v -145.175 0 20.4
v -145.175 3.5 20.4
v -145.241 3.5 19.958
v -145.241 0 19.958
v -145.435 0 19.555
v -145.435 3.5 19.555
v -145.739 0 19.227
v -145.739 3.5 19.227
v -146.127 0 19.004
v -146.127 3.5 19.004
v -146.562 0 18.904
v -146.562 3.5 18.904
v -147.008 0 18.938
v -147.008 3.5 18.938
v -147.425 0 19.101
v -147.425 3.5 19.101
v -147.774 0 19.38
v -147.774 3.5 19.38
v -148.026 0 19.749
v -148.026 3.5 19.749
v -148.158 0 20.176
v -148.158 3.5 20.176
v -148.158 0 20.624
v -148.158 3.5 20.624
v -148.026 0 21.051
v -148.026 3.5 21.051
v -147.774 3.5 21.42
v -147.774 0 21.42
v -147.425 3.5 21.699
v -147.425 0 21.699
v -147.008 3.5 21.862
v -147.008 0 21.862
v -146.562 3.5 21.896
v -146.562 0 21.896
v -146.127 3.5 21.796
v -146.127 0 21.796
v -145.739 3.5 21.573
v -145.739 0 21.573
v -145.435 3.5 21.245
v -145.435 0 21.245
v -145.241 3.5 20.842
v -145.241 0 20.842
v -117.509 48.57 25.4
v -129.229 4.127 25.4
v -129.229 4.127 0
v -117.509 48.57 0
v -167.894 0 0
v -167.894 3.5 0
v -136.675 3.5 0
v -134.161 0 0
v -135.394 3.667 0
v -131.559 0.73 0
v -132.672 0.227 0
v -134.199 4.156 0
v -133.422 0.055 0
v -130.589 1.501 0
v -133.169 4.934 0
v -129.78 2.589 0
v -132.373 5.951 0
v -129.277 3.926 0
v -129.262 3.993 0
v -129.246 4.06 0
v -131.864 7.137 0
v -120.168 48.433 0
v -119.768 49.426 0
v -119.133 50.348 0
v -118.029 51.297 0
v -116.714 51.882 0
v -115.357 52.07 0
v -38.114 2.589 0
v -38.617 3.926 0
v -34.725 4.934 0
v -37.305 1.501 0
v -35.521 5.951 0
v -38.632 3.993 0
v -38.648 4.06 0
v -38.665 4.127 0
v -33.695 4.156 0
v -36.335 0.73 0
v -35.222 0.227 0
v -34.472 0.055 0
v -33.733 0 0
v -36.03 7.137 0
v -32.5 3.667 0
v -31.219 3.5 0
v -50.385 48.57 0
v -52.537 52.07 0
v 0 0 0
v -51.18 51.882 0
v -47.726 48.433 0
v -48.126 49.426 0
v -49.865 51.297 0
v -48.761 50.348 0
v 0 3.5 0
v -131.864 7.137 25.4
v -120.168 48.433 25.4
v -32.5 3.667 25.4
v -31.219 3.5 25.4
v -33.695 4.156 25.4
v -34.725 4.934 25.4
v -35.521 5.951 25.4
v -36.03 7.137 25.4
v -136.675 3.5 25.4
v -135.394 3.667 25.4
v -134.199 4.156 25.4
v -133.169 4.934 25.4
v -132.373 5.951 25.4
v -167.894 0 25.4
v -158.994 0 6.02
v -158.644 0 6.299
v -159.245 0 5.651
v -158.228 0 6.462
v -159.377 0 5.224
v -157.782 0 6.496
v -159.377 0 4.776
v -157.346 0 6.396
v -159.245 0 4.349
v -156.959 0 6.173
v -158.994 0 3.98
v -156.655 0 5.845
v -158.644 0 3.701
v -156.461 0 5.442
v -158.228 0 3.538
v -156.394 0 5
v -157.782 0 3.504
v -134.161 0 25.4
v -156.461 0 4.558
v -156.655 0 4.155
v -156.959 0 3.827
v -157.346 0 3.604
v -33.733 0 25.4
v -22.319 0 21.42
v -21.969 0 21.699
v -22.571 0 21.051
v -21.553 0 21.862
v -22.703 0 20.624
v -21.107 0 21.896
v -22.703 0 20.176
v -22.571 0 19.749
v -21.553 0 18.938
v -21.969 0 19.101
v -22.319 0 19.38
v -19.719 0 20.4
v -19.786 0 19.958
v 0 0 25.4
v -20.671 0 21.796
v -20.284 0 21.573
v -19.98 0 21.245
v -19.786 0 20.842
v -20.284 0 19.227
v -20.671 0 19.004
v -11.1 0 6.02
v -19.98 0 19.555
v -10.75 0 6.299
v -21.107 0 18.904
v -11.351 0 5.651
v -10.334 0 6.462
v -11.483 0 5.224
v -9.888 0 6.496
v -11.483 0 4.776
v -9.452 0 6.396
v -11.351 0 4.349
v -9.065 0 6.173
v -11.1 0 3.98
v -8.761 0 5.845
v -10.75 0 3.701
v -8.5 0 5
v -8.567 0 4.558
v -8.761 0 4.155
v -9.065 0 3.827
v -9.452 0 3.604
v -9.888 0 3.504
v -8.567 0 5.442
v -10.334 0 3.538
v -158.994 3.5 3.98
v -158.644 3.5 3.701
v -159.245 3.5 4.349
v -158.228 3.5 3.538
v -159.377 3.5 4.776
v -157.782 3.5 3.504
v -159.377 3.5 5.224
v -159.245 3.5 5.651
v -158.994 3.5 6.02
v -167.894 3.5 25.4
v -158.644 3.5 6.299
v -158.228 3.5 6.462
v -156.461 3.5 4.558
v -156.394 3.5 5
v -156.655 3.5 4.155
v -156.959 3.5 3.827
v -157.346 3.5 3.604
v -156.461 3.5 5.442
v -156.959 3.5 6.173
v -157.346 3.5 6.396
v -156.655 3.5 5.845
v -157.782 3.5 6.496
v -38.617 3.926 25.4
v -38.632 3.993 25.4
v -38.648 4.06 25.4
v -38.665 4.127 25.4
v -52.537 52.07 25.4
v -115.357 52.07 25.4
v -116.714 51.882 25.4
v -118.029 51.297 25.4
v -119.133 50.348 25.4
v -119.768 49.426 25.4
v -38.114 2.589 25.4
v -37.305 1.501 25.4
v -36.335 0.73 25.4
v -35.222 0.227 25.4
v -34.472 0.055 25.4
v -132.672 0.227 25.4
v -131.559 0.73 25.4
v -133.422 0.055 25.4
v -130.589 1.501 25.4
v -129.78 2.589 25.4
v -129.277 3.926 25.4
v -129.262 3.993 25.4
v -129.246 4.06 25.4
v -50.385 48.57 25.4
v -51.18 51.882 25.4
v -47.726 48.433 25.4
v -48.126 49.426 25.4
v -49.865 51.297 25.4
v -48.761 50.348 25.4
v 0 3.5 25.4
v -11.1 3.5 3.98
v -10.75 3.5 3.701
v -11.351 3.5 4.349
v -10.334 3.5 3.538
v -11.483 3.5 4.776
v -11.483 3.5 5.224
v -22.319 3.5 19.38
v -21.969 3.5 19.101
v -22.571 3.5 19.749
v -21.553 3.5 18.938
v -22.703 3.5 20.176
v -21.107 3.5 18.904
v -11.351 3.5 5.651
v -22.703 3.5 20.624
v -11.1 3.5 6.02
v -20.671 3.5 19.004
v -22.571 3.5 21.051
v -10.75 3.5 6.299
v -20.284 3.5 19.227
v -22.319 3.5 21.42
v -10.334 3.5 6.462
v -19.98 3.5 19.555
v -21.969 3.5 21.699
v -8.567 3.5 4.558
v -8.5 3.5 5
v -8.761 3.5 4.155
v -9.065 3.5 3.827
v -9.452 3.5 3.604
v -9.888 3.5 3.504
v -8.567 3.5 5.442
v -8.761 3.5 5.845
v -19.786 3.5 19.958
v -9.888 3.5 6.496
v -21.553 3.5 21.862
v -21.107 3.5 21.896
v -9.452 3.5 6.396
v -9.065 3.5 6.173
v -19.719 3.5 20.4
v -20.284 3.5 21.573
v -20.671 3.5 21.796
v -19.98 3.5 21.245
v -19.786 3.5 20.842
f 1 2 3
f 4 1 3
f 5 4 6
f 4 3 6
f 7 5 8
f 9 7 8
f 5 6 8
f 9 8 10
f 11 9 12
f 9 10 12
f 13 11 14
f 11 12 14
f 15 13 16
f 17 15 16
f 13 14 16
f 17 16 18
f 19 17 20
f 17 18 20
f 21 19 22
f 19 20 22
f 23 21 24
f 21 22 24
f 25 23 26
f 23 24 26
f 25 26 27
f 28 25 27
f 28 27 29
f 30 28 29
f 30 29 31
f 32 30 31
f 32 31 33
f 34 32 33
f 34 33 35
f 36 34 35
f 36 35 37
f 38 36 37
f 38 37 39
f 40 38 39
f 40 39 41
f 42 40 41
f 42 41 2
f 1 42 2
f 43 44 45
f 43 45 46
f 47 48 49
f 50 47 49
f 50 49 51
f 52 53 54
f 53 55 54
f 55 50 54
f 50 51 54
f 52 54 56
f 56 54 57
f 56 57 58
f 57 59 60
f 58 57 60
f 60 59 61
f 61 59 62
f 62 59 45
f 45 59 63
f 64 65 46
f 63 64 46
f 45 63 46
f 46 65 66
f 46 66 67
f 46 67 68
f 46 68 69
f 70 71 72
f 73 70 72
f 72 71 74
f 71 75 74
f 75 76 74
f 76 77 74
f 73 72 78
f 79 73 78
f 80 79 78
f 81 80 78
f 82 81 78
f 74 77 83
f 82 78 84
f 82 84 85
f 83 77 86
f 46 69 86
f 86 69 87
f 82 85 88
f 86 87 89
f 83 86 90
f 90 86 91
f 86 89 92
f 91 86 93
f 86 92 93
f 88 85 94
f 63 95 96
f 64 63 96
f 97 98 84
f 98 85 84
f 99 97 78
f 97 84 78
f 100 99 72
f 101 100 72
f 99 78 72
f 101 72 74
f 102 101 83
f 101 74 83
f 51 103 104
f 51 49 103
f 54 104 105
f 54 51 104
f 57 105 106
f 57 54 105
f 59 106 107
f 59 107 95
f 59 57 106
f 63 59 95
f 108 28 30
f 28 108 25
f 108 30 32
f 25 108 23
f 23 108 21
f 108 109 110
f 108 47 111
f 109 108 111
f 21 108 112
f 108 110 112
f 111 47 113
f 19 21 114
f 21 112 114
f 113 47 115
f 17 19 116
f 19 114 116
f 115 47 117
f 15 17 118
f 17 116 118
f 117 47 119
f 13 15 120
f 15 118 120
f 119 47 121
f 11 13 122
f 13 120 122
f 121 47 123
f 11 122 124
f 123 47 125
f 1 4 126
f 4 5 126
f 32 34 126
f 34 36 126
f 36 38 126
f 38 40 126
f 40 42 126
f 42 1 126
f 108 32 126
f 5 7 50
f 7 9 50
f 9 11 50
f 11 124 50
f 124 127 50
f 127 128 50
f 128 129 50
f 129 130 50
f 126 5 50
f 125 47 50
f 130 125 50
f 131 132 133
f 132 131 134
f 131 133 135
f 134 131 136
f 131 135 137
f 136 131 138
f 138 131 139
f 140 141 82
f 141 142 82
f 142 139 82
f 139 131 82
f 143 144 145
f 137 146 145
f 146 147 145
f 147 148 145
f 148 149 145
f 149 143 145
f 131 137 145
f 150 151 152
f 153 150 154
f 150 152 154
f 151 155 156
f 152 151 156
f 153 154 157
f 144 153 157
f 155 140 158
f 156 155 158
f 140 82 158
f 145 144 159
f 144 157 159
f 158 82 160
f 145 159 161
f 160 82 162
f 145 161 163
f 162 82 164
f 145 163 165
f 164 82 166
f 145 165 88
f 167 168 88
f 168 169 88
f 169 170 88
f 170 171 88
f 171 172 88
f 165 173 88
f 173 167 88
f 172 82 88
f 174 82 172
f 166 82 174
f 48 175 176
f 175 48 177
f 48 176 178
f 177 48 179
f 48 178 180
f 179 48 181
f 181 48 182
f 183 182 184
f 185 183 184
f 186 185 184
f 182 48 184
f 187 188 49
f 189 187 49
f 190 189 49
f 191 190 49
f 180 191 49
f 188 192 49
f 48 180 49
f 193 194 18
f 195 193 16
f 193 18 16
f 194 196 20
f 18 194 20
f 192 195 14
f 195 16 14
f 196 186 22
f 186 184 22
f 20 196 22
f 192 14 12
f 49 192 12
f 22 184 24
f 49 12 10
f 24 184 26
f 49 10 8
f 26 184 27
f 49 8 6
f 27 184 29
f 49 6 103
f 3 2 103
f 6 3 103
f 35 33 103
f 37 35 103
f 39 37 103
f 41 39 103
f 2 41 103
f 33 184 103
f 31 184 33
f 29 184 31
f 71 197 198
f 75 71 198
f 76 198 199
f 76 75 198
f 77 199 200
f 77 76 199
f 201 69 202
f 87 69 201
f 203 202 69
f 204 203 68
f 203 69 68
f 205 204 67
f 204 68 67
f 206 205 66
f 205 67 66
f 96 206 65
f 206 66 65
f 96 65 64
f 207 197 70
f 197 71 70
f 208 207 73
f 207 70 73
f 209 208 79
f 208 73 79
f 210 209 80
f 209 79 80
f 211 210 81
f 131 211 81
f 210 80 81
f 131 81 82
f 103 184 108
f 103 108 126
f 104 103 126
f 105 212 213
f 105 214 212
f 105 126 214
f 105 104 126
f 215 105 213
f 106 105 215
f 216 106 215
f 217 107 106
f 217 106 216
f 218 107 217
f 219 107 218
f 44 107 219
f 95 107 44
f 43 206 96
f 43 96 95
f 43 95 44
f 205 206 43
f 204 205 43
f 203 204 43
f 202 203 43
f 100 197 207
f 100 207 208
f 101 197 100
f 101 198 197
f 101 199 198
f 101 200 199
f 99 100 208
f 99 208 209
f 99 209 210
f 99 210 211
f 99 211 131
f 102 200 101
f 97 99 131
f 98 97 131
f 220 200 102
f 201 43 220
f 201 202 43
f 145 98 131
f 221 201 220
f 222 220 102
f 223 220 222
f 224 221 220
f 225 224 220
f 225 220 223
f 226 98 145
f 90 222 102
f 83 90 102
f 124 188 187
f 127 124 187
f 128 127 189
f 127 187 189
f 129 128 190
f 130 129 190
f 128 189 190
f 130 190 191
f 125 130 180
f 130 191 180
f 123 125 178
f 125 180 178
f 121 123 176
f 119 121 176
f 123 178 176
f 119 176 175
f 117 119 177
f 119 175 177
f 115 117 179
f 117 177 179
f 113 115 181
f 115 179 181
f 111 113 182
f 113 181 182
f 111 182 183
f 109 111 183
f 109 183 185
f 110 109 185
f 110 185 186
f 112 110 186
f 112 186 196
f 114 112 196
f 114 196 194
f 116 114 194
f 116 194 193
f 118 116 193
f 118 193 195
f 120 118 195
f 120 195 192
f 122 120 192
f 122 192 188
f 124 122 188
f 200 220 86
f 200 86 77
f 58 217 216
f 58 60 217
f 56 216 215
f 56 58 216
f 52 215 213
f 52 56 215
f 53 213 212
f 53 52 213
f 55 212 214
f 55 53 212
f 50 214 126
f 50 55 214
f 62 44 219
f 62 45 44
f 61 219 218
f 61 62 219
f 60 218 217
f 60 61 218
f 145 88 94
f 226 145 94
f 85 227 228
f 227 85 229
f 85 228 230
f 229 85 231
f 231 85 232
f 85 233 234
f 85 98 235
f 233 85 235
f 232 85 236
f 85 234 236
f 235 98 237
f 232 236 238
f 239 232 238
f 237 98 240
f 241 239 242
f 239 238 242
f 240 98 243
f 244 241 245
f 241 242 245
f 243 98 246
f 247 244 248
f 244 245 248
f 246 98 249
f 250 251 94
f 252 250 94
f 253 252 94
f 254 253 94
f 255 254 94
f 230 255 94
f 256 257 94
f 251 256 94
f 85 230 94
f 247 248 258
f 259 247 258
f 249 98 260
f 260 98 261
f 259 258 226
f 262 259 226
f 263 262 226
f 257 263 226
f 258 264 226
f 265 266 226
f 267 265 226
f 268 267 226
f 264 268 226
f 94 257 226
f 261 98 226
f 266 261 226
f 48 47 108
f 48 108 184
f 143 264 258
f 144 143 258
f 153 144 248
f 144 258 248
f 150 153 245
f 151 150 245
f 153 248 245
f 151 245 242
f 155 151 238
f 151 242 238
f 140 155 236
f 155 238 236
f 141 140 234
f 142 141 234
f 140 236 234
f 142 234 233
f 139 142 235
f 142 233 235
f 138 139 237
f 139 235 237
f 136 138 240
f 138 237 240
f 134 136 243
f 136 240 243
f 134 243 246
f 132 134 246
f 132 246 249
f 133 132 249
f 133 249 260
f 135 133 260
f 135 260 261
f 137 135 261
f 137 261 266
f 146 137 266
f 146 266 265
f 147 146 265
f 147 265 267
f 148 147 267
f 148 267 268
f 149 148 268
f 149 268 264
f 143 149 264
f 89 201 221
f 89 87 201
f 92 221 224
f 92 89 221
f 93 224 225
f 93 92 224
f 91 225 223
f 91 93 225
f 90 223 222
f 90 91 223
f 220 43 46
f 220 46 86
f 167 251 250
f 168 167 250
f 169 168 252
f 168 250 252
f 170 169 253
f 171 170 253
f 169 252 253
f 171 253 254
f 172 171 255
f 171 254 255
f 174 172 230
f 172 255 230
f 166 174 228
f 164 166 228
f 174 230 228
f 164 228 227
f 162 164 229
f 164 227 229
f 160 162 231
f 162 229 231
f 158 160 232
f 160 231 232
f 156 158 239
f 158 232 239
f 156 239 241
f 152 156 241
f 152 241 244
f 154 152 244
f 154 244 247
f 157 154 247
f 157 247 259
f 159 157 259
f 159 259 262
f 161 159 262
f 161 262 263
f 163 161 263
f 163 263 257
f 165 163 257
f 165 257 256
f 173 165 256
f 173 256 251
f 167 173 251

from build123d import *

# Parameters (mm, degrees)
CROQUIS1_W              = 167.894
CROQUIS1_H              = 52.07
SALIENTE_EXTRUIR1_DEPTH = 25.4
CROQUIS2_W              = 35
CROQUIS2_H              = 48.57
CORTAR_EXTRUIR1_DEPTH   = 25.4
CORTAR_EXTRUIR2_DEPTH   = 25.4
REDONDEO1_R             = 5
REDONDEO2_R             = 5
REDONDEO6_R             = 5
REDONDEO7_R             = 5
REDONDEO11_R            = 5
REDONDEO12_R            = 5
REDONDEO13_R            = 5
CROQUIS4_R              = 1.5
CORTAR_EXTRUIR3_DEPTH   = 76.2


with BuildPart() as part:
    # Croquis1 → Saliente-Extruir1 (new body)
    with BuildSketch(Plane.XY):
        with Locations((-83.947, 26.035)):
            Rectangle(CROQUIS1_W, CROQUIS1_H)
    extrude(amount=SALIENTE_EXTRUIR1_DEPTH)

    # Croquis2 → Cortar-Extruir1 (cut)
    with BuildSketch(Plane.XY.offset(25.4)):
        Polygon((-119.137953593, 52.07), (-132.894, 52.07), (-132.894, 3.5), (-120.129227268, 48.57), align=None)
        with Locations((-150.394, 27.785)):
            Rectangle(CROQUIS2_W, CROQUIS2_H)
        with Locations((-17.5, 27.785)):
            Rectangle(CROQUIS2_W, CROQUIS2_H)
        Polygon((-35, 52.07), (-48.756046407, 52.07), (-47.764772732, 48.57), (-35, 3.5), align=None)
    extrude(amount=-CORTAR_EXTRUIR1_DEPTH, mode=Mode.SUBTRACT)

    # Croquis3 → Cortar-Extruir2 (cut)
    with BuildSketch(Plane.XY.offset(25.4)):
        Polygon((-117.509109836, 48.57), (-50.384890164, 48.57), (-38.5, 3.5), (-38.5, 0), (-129.394, 0), (-129.394, 3.5), align=None)
    extrude(amount=-CORTAR_EXTRUIR2_DEPTH, mode=Mode.SUBTRACT)

    # Redondeo1
    redondeo1_edges = [part.edges().sort_by_distance(p)[0] for p in [
        (-48.756046407, 52.07, 12.7),
    ]]
    fillet(redondeo1_edges, radius=REDONDEO1_R)

    # Redondeo2
    redondeo2_edges = [part.edges().sort_by_distance(p)[0] for p in [
        (-119.137953593, 52.07, 12.7),
    ]]
    fillet(redondeo2_edges, radius=REDONDEO2_R)

    # Redondeo6
    redondeo6_edges = [part.edges().sort_by_distance(p)[0] for p in [
        (-38.5, 3.5, 12.7),
    ]]
    fillet(redondeo6_edges, radius=REDONDEO6_R)

    # Redondeo7
    redondeo7_edges = [part.edges().sort_by_distance(p)[0] for p in [
        (-129.394, 3.5, 12.7),
    ]]
    fillet(redondeo7_edges, radius=REDONDEO7_R)

    # Redondeo11
    redondeo11_edges = [part.edges().sort_by_distance(p)[0] for p in [
        (-129.394, 0, 12.7),
    ]]
    fillet(redondeo11_edges, radius=REDONDEO11_R)

    # Redondeo12
    redondeo12_edges = [part.edges().sort_by_distance(p)[0] for p in [
        (-38.5, 0, 12.7),
    ]]
    fillet(redondeo12_edges, radius=REDONDEO12_R)

    # Redondeo13
    redondeo13_edges = [part.edges().sort_by_distance(p)[0] for p in [
        (-132.894, 3.5, 12.7),
        (-35, 3.5, 12.7),
    ]]
    fillet(redondeo13_edges, radius=REDONDEO13_R)

    # Croquis4 → Cortar-Extruir3 (cut)
    with BuildSketch(Plane(origin=(0, 52.07, 0), x_dir=(1, 0, 0), z_dir=(0, 1, 0))):
        with Locations((-157.894, -5)):
            Circle(CROQUIS4_R)
        with Locations((-146.674562343, -20.4)):
            Circle(CROQUIS4_R)
        with Locations((-21.219437657, -20.4)):
            Circle(CROQUIS4_R)
        with Locations((-10, -5)):
            Circle(CROQUIS4_R)
    extrude(amount=-CORTAR_EXTRUIR3_DEPTH, mode=Mode.SUBTRACT)


solid = part.part
